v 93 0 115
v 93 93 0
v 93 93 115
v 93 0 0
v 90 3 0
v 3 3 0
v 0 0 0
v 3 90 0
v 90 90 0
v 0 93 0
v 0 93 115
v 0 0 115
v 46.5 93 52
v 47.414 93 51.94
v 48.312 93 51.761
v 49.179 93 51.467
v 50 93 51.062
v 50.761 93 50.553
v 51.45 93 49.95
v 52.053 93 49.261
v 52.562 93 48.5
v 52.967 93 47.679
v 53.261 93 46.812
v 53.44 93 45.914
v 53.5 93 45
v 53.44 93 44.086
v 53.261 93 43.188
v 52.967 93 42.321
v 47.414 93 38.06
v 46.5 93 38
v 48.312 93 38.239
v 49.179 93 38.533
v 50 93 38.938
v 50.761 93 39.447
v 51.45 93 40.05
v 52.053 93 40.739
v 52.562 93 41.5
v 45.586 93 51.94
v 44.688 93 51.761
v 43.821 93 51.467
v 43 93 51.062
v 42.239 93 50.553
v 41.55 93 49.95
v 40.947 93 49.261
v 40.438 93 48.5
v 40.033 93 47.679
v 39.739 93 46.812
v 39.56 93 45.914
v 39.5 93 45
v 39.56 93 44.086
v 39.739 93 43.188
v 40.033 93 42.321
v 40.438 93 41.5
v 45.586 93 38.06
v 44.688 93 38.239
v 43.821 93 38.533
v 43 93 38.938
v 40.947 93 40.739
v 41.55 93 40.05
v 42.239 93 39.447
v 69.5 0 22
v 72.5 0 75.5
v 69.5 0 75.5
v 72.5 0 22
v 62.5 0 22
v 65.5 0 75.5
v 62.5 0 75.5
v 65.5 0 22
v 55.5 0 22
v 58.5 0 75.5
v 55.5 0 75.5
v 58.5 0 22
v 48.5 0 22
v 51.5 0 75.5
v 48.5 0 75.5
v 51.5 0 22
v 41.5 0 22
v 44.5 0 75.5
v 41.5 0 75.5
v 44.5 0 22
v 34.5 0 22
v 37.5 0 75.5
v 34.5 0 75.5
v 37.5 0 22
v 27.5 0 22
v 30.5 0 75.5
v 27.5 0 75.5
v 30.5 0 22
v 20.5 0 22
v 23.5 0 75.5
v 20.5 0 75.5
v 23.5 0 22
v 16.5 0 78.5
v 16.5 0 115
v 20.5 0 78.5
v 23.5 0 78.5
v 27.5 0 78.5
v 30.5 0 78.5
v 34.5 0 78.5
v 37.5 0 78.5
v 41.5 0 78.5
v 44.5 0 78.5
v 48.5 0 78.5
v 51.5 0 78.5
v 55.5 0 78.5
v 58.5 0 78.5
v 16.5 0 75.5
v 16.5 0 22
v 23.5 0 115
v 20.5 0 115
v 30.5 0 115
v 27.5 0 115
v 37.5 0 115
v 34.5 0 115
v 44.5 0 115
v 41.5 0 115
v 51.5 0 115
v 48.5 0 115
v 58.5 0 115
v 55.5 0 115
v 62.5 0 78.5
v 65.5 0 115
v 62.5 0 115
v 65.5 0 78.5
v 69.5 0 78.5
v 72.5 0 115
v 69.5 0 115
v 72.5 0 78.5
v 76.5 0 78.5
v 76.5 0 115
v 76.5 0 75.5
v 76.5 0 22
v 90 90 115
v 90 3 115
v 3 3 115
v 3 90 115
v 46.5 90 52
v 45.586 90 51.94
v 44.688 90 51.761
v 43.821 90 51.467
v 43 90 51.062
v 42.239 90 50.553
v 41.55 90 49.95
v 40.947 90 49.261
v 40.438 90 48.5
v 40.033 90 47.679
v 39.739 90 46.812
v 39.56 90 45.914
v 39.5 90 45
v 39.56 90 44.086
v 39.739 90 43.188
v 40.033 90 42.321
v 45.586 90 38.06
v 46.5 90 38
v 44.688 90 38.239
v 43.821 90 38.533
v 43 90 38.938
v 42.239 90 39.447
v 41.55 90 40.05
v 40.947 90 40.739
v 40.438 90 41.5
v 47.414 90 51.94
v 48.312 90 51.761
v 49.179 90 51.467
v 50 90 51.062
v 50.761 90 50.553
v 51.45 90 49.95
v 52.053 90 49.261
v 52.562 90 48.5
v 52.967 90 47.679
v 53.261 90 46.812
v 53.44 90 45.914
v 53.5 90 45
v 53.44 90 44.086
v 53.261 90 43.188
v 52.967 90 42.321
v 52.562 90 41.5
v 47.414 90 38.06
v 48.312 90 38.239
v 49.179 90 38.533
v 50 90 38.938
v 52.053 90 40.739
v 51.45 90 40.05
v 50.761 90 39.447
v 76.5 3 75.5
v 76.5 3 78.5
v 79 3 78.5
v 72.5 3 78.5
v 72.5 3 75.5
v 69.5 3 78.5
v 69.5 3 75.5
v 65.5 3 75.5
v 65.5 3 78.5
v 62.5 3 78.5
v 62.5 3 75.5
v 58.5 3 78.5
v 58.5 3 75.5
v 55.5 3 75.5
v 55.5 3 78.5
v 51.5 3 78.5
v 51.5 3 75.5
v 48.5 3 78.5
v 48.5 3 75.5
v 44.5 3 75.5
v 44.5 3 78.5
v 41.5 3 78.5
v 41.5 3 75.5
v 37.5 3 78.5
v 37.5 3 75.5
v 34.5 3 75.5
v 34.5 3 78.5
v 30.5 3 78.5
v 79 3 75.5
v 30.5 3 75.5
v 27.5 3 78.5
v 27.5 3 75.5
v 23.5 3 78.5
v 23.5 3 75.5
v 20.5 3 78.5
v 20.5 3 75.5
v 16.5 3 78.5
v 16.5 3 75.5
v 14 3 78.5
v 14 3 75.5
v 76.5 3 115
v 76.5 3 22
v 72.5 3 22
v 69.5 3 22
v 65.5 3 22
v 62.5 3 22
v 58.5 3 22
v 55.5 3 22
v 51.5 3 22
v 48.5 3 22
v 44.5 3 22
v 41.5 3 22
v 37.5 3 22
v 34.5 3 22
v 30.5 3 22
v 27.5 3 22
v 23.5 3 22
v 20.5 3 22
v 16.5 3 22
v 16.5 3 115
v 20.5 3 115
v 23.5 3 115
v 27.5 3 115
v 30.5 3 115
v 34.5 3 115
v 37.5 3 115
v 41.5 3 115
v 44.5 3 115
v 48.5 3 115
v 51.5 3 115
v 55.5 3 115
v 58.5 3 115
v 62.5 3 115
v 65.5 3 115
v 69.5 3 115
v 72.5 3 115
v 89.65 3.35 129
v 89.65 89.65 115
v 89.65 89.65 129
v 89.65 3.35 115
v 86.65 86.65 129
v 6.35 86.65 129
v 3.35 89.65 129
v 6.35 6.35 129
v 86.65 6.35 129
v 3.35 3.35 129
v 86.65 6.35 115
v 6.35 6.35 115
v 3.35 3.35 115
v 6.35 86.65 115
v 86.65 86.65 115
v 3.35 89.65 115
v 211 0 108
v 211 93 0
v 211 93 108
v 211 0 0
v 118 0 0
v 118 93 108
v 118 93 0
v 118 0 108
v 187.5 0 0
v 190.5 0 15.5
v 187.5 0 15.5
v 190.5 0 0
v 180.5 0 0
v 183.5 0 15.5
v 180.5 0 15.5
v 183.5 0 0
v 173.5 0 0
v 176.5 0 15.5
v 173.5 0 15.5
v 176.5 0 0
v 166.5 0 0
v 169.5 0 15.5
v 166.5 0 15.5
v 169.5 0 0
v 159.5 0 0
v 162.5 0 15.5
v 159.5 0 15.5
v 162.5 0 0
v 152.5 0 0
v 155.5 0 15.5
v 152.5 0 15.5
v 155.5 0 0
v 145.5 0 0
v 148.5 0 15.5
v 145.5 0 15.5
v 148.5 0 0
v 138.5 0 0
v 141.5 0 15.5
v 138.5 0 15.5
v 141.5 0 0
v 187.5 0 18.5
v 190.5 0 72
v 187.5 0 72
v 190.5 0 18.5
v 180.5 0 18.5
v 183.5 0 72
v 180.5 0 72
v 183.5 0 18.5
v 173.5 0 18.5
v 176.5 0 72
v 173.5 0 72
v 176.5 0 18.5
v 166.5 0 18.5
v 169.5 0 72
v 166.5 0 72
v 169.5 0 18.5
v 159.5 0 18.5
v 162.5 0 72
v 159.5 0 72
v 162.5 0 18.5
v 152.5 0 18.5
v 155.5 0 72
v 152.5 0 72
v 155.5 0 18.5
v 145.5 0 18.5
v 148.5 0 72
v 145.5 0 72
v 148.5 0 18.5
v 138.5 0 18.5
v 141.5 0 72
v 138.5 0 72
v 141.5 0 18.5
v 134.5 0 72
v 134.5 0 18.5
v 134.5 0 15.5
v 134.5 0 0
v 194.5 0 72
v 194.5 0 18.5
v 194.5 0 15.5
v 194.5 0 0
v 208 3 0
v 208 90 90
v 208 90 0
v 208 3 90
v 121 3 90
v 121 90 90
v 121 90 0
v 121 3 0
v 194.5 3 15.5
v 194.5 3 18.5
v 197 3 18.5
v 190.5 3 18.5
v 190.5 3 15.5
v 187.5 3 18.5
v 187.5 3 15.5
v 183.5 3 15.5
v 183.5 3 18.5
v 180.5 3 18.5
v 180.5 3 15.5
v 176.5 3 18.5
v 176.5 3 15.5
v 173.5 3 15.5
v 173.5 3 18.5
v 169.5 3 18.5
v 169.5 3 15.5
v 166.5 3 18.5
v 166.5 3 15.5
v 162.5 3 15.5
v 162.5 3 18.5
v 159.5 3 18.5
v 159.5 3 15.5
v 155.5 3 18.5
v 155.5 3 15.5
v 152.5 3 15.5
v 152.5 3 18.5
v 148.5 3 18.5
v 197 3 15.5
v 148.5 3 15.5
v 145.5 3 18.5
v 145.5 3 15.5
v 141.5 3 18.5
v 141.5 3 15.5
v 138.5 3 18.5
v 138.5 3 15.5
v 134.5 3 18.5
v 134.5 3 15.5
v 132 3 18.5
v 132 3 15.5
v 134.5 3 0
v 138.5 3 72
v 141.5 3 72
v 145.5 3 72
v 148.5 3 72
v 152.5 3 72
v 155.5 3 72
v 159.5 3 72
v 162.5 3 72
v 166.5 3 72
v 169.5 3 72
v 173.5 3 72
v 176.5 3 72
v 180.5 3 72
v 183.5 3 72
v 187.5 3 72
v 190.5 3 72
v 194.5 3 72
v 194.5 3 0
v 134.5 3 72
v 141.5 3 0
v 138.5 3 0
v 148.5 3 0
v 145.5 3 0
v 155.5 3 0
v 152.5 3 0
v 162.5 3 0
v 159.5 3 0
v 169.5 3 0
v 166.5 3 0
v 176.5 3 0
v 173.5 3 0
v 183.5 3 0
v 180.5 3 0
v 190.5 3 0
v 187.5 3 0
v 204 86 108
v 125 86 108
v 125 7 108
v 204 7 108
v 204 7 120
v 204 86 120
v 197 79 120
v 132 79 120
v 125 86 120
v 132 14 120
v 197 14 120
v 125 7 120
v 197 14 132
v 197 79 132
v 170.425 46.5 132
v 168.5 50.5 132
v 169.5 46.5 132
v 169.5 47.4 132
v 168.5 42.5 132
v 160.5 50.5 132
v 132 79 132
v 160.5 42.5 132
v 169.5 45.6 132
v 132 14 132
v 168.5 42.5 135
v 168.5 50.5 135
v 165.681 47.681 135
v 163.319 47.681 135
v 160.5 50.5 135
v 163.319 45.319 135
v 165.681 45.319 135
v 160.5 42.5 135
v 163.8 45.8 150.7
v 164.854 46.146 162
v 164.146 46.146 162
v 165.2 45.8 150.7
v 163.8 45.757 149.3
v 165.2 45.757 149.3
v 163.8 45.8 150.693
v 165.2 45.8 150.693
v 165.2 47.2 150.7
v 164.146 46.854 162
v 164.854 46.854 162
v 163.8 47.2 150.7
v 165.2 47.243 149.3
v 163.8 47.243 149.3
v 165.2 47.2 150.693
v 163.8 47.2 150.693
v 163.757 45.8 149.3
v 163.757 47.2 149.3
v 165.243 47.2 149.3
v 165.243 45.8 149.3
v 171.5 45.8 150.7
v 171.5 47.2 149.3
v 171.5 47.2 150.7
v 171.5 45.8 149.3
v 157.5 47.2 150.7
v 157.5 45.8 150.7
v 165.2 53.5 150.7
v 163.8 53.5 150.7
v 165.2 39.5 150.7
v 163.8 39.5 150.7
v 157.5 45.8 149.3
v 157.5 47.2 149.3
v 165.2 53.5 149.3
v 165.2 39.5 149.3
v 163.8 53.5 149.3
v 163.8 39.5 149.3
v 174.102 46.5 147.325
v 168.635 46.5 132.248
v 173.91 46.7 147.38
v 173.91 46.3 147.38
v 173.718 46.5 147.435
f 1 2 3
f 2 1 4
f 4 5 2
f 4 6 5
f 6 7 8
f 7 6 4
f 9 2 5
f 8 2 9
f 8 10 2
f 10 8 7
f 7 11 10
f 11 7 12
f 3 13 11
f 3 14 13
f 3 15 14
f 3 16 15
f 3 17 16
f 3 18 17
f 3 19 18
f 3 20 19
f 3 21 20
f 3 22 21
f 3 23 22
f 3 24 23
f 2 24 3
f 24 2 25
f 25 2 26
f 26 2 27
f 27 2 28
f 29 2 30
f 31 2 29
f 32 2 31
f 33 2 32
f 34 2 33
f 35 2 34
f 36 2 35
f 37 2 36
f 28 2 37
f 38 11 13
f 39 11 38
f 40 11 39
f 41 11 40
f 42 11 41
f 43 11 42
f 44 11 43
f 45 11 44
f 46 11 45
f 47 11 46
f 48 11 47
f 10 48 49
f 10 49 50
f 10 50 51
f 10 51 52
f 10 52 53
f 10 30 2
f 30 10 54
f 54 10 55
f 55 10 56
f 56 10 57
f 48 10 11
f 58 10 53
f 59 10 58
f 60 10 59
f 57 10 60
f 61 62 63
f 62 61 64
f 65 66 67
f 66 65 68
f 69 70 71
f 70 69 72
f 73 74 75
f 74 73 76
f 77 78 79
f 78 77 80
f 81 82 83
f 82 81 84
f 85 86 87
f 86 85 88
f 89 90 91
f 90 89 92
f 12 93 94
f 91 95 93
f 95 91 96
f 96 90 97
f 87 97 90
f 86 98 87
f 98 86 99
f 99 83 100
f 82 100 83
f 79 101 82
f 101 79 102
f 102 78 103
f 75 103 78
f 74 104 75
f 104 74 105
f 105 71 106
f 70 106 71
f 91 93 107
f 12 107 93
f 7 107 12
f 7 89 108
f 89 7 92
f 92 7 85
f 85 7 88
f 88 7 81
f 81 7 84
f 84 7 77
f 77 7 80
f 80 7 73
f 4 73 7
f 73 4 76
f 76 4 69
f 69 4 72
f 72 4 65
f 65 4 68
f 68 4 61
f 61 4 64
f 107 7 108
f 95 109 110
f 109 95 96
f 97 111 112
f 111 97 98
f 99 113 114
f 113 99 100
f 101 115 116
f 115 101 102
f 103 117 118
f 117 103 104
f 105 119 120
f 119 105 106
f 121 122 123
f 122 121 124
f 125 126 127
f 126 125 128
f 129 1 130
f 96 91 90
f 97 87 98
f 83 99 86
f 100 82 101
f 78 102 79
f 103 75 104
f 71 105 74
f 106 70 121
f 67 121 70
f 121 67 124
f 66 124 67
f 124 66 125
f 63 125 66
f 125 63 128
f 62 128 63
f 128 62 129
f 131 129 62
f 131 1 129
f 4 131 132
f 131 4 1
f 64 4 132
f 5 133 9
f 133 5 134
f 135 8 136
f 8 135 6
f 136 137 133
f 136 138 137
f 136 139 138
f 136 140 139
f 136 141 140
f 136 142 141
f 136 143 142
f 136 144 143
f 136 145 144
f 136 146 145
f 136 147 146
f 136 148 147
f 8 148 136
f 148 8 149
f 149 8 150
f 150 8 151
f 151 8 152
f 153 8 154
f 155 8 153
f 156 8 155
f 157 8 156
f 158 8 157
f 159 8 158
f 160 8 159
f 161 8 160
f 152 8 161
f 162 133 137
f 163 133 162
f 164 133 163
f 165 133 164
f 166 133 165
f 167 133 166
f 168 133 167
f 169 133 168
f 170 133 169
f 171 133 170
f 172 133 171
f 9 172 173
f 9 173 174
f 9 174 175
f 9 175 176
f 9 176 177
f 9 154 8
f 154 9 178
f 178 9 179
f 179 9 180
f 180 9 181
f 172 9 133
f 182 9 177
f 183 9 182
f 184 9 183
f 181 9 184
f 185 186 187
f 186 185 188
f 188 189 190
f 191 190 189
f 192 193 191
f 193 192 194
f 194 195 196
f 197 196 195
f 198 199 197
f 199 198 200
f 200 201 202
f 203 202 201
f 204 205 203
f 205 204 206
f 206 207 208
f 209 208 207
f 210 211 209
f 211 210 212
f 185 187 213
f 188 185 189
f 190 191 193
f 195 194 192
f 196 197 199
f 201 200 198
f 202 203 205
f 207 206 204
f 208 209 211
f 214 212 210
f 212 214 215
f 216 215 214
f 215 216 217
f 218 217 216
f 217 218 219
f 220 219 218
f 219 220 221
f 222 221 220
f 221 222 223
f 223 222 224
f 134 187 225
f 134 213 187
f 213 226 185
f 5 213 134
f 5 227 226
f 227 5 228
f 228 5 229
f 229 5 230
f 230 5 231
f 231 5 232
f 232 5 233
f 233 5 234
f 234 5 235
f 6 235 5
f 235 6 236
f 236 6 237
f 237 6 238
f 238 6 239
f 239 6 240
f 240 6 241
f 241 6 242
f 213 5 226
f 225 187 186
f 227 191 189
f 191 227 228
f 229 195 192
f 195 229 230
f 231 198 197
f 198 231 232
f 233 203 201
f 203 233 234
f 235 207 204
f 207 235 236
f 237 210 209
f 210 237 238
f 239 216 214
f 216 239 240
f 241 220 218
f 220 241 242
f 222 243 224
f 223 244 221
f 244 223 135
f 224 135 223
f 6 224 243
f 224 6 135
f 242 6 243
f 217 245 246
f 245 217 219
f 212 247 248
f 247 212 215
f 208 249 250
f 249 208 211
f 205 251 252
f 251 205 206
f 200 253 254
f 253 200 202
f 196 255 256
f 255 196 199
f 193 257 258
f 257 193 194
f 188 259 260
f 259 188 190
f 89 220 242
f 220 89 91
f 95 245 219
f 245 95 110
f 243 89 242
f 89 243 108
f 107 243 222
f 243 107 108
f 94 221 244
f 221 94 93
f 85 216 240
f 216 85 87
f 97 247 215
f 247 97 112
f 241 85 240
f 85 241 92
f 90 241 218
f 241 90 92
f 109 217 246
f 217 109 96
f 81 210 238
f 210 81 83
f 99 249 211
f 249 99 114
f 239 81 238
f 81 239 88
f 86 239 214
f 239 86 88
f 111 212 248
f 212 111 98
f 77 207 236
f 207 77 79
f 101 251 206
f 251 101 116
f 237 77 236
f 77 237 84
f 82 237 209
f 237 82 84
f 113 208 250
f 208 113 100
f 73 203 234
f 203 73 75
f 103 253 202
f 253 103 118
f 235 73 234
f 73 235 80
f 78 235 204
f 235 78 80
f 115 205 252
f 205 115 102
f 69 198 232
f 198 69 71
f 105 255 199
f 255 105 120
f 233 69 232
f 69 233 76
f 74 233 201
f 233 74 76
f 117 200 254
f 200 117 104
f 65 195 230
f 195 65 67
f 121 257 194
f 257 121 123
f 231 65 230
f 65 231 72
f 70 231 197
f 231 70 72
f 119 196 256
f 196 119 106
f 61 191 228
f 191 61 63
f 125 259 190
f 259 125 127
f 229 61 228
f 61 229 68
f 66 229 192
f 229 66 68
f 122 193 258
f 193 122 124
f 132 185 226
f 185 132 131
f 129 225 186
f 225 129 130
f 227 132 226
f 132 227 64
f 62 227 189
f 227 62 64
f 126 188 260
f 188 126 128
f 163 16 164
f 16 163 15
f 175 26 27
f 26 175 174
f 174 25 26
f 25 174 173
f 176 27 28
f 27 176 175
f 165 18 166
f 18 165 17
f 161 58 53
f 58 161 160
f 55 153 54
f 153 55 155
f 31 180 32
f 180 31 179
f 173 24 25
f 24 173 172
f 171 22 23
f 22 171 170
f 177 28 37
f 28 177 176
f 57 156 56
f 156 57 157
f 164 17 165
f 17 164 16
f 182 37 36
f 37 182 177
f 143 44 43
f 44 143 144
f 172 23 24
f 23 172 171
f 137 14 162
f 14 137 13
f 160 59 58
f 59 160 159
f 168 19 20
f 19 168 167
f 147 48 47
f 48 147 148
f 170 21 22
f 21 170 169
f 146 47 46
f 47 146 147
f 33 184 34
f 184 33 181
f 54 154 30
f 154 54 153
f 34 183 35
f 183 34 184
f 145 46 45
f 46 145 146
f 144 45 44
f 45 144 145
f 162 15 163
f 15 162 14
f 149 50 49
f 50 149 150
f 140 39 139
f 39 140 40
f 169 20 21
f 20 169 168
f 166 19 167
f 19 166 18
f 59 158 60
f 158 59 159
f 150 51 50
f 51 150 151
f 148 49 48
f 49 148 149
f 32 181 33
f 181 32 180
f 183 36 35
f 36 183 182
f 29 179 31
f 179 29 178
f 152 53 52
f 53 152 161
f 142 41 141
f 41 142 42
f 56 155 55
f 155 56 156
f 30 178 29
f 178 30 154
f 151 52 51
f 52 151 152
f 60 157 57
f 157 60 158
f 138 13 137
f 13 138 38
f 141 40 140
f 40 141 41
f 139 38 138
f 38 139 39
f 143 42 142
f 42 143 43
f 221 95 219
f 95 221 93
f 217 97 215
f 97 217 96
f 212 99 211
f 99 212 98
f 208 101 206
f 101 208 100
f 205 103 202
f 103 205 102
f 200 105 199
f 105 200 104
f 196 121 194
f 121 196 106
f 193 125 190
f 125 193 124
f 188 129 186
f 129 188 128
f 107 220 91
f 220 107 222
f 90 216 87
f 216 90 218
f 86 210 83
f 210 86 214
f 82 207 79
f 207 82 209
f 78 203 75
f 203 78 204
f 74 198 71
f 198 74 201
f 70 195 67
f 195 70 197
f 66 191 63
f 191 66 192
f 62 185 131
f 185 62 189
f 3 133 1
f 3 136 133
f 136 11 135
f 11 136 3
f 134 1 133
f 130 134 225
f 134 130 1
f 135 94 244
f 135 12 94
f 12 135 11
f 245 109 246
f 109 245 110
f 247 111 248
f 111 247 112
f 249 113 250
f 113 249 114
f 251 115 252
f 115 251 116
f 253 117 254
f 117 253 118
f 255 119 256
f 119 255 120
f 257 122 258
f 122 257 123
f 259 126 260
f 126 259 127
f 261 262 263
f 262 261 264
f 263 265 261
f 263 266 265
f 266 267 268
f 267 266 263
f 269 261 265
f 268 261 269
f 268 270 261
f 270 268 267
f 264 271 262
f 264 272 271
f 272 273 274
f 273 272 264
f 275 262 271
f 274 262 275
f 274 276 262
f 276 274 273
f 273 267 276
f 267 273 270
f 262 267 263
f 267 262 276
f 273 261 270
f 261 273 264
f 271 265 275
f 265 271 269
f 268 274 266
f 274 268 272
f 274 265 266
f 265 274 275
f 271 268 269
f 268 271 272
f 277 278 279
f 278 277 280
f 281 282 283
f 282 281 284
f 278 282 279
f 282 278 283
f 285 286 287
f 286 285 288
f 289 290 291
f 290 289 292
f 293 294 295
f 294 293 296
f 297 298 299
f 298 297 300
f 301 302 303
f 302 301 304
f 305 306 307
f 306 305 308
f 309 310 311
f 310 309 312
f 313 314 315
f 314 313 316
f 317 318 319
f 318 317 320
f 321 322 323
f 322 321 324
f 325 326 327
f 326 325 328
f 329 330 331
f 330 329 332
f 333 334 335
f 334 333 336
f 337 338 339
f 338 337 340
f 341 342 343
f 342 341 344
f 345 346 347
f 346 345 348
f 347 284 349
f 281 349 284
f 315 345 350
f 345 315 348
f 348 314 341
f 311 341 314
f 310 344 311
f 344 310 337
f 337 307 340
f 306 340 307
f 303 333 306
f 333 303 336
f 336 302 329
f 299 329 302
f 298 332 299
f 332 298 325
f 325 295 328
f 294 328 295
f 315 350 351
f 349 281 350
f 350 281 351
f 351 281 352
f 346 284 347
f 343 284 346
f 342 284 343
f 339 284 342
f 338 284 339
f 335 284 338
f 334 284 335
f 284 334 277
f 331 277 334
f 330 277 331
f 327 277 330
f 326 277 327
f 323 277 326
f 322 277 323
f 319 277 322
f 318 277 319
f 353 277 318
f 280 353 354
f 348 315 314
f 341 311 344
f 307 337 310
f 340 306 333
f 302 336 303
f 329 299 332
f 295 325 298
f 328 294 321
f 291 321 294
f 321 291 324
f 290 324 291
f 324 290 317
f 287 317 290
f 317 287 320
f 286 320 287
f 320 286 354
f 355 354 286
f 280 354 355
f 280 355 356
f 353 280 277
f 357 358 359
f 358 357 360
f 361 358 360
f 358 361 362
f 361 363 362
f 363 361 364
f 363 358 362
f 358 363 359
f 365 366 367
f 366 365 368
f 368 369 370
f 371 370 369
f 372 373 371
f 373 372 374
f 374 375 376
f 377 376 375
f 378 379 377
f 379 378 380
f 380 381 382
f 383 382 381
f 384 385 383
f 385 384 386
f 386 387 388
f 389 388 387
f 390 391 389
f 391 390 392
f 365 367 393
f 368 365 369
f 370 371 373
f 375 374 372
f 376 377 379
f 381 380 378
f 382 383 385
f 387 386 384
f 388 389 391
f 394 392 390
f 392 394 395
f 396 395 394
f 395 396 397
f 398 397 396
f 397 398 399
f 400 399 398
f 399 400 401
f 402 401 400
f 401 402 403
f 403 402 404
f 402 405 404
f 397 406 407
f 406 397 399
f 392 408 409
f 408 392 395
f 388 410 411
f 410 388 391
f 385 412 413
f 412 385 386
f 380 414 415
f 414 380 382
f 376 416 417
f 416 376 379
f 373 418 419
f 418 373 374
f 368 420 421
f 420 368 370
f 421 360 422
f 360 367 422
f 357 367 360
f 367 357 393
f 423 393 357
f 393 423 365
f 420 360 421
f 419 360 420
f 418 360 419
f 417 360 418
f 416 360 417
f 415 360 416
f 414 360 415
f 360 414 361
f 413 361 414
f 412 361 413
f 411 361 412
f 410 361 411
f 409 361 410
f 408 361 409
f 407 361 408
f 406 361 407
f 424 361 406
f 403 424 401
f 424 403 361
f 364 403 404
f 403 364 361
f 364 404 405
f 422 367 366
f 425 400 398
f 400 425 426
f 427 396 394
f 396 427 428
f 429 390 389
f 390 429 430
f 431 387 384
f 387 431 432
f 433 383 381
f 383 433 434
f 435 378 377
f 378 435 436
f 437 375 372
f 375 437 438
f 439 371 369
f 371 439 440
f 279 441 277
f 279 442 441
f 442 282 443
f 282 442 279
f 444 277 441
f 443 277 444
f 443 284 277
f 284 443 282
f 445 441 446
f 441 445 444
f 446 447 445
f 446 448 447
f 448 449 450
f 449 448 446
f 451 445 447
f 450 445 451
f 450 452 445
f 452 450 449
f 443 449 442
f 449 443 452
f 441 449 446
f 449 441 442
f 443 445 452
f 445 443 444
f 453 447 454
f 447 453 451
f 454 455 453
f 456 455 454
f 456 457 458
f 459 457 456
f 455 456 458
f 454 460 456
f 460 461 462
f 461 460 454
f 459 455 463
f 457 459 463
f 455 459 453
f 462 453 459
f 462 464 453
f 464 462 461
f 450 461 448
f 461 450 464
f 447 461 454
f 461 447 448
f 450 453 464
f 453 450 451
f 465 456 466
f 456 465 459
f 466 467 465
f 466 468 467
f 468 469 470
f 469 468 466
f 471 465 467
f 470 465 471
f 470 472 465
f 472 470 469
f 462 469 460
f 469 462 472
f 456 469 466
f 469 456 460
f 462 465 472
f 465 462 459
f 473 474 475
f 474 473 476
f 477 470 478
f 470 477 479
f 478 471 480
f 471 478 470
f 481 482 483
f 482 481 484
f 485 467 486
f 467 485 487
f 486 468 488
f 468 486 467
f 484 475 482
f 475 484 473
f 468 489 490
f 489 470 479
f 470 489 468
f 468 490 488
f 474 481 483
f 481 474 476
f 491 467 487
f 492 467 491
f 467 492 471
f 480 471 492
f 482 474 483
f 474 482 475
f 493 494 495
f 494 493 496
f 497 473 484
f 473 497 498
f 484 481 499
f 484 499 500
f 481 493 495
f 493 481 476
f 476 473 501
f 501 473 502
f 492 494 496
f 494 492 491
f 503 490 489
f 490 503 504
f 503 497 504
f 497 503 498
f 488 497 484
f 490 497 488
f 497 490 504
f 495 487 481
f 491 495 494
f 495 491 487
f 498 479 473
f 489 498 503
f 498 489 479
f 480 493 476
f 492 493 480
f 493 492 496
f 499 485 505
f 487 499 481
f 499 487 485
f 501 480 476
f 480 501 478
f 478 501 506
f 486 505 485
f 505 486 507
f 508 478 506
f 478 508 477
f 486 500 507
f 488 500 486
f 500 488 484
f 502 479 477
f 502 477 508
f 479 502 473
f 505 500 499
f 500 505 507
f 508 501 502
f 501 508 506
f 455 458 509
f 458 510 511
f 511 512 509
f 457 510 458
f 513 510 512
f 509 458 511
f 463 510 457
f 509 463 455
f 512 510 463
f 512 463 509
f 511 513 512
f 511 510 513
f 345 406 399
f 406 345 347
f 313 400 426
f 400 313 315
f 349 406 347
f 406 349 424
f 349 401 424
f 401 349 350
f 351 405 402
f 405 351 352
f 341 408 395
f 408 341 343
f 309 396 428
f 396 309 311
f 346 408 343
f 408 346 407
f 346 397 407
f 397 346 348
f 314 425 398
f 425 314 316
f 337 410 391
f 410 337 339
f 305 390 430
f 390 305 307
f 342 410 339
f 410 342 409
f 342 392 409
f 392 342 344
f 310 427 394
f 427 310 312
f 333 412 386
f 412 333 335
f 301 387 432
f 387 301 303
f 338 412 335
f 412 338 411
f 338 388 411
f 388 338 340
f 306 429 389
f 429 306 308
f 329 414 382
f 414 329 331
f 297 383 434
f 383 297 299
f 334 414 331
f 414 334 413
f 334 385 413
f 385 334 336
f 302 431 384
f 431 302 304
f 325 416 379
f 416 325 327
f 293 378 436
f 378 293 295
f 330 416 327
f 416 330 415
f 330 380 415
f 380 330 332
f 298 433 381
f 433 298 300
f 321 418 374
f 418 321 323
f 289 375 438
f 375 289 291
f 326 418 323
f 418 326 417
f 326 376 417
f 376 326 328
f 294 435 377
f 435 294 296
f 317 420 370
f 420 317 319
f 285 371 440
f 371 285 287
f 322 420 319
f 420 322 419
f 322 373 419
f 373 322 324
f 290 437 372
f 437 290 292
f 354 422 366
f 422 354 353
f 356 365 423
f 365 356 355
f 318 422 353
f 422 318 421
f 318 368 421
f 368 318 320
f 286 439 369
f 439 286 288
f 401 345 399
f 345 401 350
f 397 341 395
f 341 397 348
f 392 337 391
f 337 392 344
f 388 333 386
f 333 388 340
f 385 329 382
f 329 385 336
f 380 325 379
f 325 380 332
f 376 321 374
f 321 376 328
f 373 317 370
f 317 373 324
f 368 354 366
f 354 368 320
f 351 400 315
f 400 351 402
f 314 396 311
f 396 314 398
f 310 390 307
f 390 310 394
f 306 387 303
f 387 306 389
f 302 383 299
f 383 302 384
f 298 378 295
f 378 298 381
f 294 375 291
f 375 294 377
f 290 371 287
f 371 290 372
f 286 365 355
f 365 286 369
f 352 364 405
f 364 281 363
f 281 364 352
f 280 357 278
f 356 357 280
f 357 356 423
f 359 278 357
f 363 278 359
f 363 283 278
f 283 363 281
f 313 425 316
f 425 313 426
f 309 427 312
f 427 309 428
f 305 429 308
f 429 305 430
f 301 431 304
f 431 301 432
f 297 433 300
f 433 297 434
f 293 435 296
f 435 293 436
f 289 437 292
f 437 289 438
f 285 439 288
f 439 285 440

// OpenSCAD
// --- LumenTrace Lautsprecher-Gehaeuse (Cyberpunk-Skyline-Stil) ---
// Dekorative Huellen fuer das 2.1-Set, gestaltet als Wolkenkratzer
// passend zur Skyline (skyline_buildings.scad) und den Laternen.
// Alle Masse in Millimetern (mm).
//
// Achsen:  x = Breite (Front),  y = Tiefe (Front y=0 -> Hinten y=max),
//          z = Hoehe.  Lautsprecher werden von UNTEN eingeschoben,
//          Bodenplatte separat. Front hat ein Schallfenster, hinten
//          sitzen die Kabel-/Schalter-Aussparungen.
//
// ECHTE MASSE:
//  Satellit (L/R): 85 x 85 x 205,  Kabel hinten bei z=45
//  Subwoofer:      115(B) x 225(T) x 235(H)
//                  Kabel hinten z=30..100,  On/Off hinten z=180..200
//                  (Knoepfe vorne sind im Schallfenster zugaenglich)

// ============================ AUSWAHL =============================
// model: "satellite" | "subwoofer"
model = "satellite";
// part:  "assembled" | "lower" | "upper" | "baseplate"
part  = "assembled";

// ============================ PARAMETER ===========================
wall       = 3.0;     // Wandstaerke
clearance  = 1.0;     // Spiel pro Seite zum Lautsprecher
top_solid  = 6.0;     // Deckenstaerke ueber dem Lautsprecher

// Deko-Spitze
spire_steps = 3;
spire_step_h = 12;
spire_inset = 7;      // Verjuengung pro Stufe und Seite

// Schallfenster (Front)
win_margin_x = 14;    // Randabstand links/rechts
win_z0       = 22;    // Unterkante Fenster
win_top_off  = 24;    // Abstand zur Gehaeuse-Oberkante des Lautsprecherteils
win_bars     = 2;     // Anzahl Querstreben im Fenster

// Druck-Teilung
join_tol = 0.35;
join_h   = 14;

$fn = 48;

// --- Modellabhaengige Werte ---
// [breite_x, tiefe_y, hoehe_z]
spk      = (model == "subwoofer") ? [115, 225, 235] : [85, 85, 205];
split_z  = (model == "subwoofer") ? 130 : 115;

inner_x = spk[0] + 2*clearance;
inner_y = spk[1] + 2*clearance;
outer_x = inner_x + 2*wall;
outer_y = inner_y + 2*wall;
body_h  = spk[2] + top_solid;            // Hauptkoerper (oben geschlossen)
spire_h = spire_steps*spire_step_h;
total_h = body_h + spire_h + 30;         // inkl. Antenne (grob)

// ============================ HELFER ==============================

// Cyberpunk-Antenne (eckig, asymmetrisch)
module cyber_antenna(x, y, z, main = 30) {
    translate([x, y, z]) {
        translate([0,0,1.5]) cube([8, 8, 3], center = true);
        rotate([0,0,45]) cylinder(h = main, d1 = 3.6, d2 = 1.0, $fn = 4);
        translate([0,0,main*0.6]) cube([14, 1.4, 1.4], center = true);
        translate([0,0,main*0.6]) cube([1.4, 14, 1.4], center = true);
        translate([5,0,0]) rotate([0,16,0]) cylinder(h = 16, d1 = 1.8, d2 = 0.4, $fn = 4);
    }
}

// Hohler Hauptkoerper: unten offen, oben geschlossen
module body_shell() {
    difference() {
        cube([outer_x, outer_y, body_h]);
        translate([wall, wall, -1])
            cube([inner_x, inner_y, spk[2] + 1]);
    }
}

// Cyberpunk-Schallgitter: vertikale Lamellen-Schlitze (Front = y 0).
// Der Lautsprecher bleibt dahinter verdeckt; ~55% offene Flaeche fuer
// guten Klang. Vertikale Schlitze drucken aufrecht ueberhangfrei.
grille_slot = 4.0;   // Schlitzbreite
grille_step = 7.0;   // Raster (Schlitz + Steg)
module front_window() {
    gw = outer_x - 2*win_margin_x;
    gh = body_h - win_z0 - win_top_off;
    n = floor((gw + (grille_step - grille_slot)) / grille_step);
    group_w = n*grille_slot + (n-1)*(grille_step - grille_slot);
    x0 = (outer_x - group_w) / 2;
    for (i = [0 : n-1])
        translate([x0 + i*grille_step, -1, win_z0])
            cube([grille_slot, wall + 2, gh]);
}
// Horizontale Querstege unterbrechen das Gitter (Stabilitaet + Tech-Look)
module front_bars() {
    win_w = outer_x - 2*win_margin_x;
    win_h = body_h - win_z0 - win_top_off;
    for (i = [1 : win_bars]) {
        bz = win_z0 + win_h * i/(win_bars+1);
        translate([win_margin_x, 0, bz - 1.5])
            cube([win_w, wall, 3.0]);
    }
}

// Rundes Kabelloch hinten (y = max)
module cable_hole(z, dia = 14) {
    translate([outer_x/2, outer_y - wall - 1, z])
        rotate([-90, 0, 0])
            cylinder(h = wall + 2, d = dia);
}

// Rechteckige Aussparung hinten (y = max), Hoehenbereich z0..z1
module rear_opening(z0, z1, width = 40) {
    translate([(outer_x - width)/2, outer_y - wall - 1, z0])
        cube([width, wall + 2, z1 - z0]);
}

// Gestaffelte Deko-Spitze + Antenne auf body_h
module spire() {
    translate([0, 0, body_h]) {
        for (i = [0 : spire_steps-1]) {
            ins = spire_inset * i;
            translate([ins, ins, i*spire_step_h])
                cube([outer_x - 2*ins, outer_y - 2*ins, spire_step_h]);
        }
    }
    cyber_antenna(outer_x/2, outer_y/2, body_h + spire_h, 30);
}

// Komplettes Gehaeuse (ungeteilt)
module enclosure_full() {
    union() {
        difference() {
            union() {
                body_shell();
                spire();
            }
            front_window();
            if (model == "subwoofer") {
                rear_opening(30, 100, 50);    // Kabelausgaenge
                rear_opening(180, 200, 40);   // On/Off
            } else {
                cable_hole(45, 14);           // Satellit: Kabel hinten z=45
            }
        }
        front_bars();
    }
}

// --- Steck-Kragen fuer geteilten Druck ---
module join_collar() {
    translate([wall + join_tol, wall + join_tol, split_z])
        difference() {
            cube([inner_x - 2*join_tol, inner_y - 2*join_tol, join_h]);
            translate([wall, wall, -1])
                cube([inner_x - 2*join_tol - 2*wall, inner_y - 2*join_tol - 2*wall, join_h + 2]);
        }
}

module lower_part() {
    union() {
        intersection() {
            enclosure_full();
            cube([outer_x, outer_y, split_z]);
        }
        join_collar();
    }
}

module upper_part() {
    translate([0, 0, -split_z])
        intersection() {
            enclosure_full();
            translate([0, 0, split_z]) cube([outer_x, outer_y, total_h]);
        }
}

// Separate Bodenplatte mit Einrast-Lippe + Kabelschlitz hinten
module baseplate() {
    plate_h = 4;
    lip_h   = 6;
    union() {
        cube([outer_x, outer_y, plate_h]);
        translate([wall + join_tol, wall + join_tol, plate_h])
            difference() {
                cube([inner_x - 2*join_tol, inner_y - 2*join_tol, lip_h]);
                translate([wall, wall, -1])
                    cube([inner_x - 2*join_tol - 2*wall, inner_y - 2*join_tol - 2*wall, lip_h + 2]);
                // Kabelschlitz hinten
                translate([(inner_x)/2 - 8, inner_y - 2*join_tol - wall - 1, -1])
                    cube([16, wall + 2, lip_h + 2]);
            }
    }
}

// ============================ AUSGABE =============================
if      (part == "assembled") { lower_part(); translate([outer_x + 25, 0, 0]) upper_part(); }
else if (part == "lower")     lower_part();
else if (part == "upper")     upper_part();
else if (part == "baseplate") baseplate();
